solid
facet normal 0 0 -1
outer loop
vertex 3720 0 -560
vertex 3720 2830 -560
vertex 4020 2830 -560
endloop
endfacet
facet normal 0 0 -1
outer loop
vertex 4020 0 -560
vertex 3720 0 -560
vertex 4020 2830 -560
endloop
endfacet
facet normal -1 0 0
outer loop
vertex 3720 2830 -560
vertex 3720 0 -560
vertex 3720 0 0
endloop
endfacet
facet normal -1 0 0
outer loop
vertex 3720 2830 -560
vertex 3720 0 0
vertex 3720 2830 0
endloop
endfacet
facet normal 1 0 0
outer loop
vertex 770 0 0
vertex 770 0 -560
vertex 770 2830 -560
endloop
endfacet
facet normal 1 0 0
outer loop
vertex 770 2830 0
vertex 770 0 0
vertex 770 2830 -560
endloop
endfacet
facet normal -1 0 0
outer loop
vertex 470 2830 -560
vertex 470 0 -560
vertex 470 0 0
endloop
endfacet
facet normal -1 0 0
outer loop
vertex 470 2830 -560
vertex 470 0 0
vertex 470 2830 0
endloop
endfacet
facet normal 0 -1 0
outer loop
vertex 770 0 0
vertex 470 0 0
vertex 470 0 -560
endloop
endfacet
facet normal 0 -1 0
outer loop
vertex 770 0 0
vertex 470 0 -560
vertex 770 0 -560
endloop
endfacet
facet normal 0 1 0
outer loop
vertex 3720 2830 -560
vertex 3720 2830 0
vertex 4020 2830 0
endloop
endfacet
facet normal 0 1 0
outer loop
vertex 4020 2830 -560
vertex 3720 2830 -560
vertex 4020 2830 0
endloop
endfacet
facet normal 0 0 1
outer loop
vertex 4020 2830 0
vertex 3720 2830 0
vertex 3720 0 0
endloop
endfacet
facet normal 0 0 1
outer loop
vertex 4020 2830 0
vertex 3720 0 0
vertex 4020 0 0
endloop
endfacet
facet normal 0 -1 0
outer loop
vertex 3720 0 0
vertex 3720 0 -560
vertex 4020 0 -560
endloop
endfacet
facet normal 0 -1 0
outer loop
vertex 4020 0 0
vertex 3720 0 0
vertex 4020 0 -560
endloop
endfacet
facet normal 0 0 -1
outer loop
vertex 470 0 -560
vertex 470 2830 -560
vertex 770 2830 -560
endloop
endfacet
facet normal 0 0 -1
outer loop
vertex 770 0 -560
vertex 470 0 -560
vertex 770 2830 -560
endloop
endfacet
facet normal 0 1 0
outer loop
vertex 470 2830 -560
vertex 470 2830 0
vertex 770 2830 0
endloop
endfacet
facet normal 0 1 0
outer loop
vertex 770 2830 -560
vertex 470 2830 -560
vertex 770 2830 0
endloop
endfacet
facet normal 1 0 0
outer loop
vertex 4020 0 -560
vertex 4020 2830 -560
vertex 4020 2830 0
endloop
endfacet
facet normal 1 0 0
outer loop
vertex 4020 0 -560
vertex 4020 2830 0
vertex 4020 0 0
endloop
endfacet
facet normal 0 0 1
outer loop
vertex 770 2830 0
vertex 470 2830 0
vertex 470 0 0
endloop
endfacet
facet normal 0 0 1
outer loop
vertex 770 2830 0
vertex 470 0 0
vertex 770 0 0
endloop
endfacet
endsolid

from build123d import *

# Parameters (mm, degrees)
SKETCH1_W                 = 4400
SKETCH1_H                 = 2900
BOSS_EXTRUDE1_DEPTH       = 9000
BOSS_EXTRUDE2_START       = -9000
BOSS_EXTRUDE2_OUTLINE_W   = 4400
BOSS_EXTRUDE2_OUTLINE_H   = 2900
BOSS_EXTRUDE2_DEPTH       = 8440
BOSS_EXTRUDE2_START_2     = -560
BOSS_EXTRUDE2_2_DEPTH     = 560
BOSS_EXTRUDE2_3_OUTLINE_W = 300
BOSS_EXTRUDE2_3_OUTLINE_H = 2830
BOSS_EXTRUDE2_3_DEPTH     = 560


with BuildPart() as part:
    # Sketch1 → Boss-Extrude1 (new body)
    with BuildSketch(Plane.XY):
        with Locations((2200, 1450)):
            Rectangle(SKETCH1_W, SKETCH1_H)
    extrude(amount=-BOSS_EXTRUDE1_DEPTH)

    # Boss-Extrude2: read off the stored shape, not the designer's step
    # Boss-Extrude2 outline → Boss-Extrude2 (cut)
    with BuildSketch(Plane.XY.offset(BOSS_EXTRUDE2_START)):
        with Locations((2200, 1450)):
            Rectangle(BOSS_EXTRUDE2_OUTLINE_W, BOSS_EXTRUDE2_OUTLINE_H)
    extrude(amount=BOSS_EXTRUDE2_DEPTH, mode=Mode.SUBTRACT)

    # Boss-Extrude2 2 outline → Boss-Extrude2 2 (cut)
    with BuildSketch(Plane.XY.offset(BOSS_EXTRUDE2_START_2)):
        Polygon((3720, 0), (3720, 2830), (4020, 2830), (4020, 0), (4400, 0), (4400, 2900), (0, 2900), (0, 0), align=None)
    extrude(amount=BOSS_EXTRUDE2_2_DEPTH, mode=Mode.SUBTRACT)


with BuildPart() as body_2:
    # Boss-Extrude2 3 outline → Boss-Extrude2 3 (new body)
    with BuildSketch(Plane.XY.offset(BOSS_EXTRUDE2_START_2)):
        with Locations((620, 1415)):
            Rectangle(BOSS_EXTRUDE2_3_OUTLINE_W, BOSS_EXTRUDE2_3_OUTLINE_H)
    extrude(amount=BOSS_EXTRUDE2_3_DEPTH)


solid = Compound([part.part, body_2.part])
